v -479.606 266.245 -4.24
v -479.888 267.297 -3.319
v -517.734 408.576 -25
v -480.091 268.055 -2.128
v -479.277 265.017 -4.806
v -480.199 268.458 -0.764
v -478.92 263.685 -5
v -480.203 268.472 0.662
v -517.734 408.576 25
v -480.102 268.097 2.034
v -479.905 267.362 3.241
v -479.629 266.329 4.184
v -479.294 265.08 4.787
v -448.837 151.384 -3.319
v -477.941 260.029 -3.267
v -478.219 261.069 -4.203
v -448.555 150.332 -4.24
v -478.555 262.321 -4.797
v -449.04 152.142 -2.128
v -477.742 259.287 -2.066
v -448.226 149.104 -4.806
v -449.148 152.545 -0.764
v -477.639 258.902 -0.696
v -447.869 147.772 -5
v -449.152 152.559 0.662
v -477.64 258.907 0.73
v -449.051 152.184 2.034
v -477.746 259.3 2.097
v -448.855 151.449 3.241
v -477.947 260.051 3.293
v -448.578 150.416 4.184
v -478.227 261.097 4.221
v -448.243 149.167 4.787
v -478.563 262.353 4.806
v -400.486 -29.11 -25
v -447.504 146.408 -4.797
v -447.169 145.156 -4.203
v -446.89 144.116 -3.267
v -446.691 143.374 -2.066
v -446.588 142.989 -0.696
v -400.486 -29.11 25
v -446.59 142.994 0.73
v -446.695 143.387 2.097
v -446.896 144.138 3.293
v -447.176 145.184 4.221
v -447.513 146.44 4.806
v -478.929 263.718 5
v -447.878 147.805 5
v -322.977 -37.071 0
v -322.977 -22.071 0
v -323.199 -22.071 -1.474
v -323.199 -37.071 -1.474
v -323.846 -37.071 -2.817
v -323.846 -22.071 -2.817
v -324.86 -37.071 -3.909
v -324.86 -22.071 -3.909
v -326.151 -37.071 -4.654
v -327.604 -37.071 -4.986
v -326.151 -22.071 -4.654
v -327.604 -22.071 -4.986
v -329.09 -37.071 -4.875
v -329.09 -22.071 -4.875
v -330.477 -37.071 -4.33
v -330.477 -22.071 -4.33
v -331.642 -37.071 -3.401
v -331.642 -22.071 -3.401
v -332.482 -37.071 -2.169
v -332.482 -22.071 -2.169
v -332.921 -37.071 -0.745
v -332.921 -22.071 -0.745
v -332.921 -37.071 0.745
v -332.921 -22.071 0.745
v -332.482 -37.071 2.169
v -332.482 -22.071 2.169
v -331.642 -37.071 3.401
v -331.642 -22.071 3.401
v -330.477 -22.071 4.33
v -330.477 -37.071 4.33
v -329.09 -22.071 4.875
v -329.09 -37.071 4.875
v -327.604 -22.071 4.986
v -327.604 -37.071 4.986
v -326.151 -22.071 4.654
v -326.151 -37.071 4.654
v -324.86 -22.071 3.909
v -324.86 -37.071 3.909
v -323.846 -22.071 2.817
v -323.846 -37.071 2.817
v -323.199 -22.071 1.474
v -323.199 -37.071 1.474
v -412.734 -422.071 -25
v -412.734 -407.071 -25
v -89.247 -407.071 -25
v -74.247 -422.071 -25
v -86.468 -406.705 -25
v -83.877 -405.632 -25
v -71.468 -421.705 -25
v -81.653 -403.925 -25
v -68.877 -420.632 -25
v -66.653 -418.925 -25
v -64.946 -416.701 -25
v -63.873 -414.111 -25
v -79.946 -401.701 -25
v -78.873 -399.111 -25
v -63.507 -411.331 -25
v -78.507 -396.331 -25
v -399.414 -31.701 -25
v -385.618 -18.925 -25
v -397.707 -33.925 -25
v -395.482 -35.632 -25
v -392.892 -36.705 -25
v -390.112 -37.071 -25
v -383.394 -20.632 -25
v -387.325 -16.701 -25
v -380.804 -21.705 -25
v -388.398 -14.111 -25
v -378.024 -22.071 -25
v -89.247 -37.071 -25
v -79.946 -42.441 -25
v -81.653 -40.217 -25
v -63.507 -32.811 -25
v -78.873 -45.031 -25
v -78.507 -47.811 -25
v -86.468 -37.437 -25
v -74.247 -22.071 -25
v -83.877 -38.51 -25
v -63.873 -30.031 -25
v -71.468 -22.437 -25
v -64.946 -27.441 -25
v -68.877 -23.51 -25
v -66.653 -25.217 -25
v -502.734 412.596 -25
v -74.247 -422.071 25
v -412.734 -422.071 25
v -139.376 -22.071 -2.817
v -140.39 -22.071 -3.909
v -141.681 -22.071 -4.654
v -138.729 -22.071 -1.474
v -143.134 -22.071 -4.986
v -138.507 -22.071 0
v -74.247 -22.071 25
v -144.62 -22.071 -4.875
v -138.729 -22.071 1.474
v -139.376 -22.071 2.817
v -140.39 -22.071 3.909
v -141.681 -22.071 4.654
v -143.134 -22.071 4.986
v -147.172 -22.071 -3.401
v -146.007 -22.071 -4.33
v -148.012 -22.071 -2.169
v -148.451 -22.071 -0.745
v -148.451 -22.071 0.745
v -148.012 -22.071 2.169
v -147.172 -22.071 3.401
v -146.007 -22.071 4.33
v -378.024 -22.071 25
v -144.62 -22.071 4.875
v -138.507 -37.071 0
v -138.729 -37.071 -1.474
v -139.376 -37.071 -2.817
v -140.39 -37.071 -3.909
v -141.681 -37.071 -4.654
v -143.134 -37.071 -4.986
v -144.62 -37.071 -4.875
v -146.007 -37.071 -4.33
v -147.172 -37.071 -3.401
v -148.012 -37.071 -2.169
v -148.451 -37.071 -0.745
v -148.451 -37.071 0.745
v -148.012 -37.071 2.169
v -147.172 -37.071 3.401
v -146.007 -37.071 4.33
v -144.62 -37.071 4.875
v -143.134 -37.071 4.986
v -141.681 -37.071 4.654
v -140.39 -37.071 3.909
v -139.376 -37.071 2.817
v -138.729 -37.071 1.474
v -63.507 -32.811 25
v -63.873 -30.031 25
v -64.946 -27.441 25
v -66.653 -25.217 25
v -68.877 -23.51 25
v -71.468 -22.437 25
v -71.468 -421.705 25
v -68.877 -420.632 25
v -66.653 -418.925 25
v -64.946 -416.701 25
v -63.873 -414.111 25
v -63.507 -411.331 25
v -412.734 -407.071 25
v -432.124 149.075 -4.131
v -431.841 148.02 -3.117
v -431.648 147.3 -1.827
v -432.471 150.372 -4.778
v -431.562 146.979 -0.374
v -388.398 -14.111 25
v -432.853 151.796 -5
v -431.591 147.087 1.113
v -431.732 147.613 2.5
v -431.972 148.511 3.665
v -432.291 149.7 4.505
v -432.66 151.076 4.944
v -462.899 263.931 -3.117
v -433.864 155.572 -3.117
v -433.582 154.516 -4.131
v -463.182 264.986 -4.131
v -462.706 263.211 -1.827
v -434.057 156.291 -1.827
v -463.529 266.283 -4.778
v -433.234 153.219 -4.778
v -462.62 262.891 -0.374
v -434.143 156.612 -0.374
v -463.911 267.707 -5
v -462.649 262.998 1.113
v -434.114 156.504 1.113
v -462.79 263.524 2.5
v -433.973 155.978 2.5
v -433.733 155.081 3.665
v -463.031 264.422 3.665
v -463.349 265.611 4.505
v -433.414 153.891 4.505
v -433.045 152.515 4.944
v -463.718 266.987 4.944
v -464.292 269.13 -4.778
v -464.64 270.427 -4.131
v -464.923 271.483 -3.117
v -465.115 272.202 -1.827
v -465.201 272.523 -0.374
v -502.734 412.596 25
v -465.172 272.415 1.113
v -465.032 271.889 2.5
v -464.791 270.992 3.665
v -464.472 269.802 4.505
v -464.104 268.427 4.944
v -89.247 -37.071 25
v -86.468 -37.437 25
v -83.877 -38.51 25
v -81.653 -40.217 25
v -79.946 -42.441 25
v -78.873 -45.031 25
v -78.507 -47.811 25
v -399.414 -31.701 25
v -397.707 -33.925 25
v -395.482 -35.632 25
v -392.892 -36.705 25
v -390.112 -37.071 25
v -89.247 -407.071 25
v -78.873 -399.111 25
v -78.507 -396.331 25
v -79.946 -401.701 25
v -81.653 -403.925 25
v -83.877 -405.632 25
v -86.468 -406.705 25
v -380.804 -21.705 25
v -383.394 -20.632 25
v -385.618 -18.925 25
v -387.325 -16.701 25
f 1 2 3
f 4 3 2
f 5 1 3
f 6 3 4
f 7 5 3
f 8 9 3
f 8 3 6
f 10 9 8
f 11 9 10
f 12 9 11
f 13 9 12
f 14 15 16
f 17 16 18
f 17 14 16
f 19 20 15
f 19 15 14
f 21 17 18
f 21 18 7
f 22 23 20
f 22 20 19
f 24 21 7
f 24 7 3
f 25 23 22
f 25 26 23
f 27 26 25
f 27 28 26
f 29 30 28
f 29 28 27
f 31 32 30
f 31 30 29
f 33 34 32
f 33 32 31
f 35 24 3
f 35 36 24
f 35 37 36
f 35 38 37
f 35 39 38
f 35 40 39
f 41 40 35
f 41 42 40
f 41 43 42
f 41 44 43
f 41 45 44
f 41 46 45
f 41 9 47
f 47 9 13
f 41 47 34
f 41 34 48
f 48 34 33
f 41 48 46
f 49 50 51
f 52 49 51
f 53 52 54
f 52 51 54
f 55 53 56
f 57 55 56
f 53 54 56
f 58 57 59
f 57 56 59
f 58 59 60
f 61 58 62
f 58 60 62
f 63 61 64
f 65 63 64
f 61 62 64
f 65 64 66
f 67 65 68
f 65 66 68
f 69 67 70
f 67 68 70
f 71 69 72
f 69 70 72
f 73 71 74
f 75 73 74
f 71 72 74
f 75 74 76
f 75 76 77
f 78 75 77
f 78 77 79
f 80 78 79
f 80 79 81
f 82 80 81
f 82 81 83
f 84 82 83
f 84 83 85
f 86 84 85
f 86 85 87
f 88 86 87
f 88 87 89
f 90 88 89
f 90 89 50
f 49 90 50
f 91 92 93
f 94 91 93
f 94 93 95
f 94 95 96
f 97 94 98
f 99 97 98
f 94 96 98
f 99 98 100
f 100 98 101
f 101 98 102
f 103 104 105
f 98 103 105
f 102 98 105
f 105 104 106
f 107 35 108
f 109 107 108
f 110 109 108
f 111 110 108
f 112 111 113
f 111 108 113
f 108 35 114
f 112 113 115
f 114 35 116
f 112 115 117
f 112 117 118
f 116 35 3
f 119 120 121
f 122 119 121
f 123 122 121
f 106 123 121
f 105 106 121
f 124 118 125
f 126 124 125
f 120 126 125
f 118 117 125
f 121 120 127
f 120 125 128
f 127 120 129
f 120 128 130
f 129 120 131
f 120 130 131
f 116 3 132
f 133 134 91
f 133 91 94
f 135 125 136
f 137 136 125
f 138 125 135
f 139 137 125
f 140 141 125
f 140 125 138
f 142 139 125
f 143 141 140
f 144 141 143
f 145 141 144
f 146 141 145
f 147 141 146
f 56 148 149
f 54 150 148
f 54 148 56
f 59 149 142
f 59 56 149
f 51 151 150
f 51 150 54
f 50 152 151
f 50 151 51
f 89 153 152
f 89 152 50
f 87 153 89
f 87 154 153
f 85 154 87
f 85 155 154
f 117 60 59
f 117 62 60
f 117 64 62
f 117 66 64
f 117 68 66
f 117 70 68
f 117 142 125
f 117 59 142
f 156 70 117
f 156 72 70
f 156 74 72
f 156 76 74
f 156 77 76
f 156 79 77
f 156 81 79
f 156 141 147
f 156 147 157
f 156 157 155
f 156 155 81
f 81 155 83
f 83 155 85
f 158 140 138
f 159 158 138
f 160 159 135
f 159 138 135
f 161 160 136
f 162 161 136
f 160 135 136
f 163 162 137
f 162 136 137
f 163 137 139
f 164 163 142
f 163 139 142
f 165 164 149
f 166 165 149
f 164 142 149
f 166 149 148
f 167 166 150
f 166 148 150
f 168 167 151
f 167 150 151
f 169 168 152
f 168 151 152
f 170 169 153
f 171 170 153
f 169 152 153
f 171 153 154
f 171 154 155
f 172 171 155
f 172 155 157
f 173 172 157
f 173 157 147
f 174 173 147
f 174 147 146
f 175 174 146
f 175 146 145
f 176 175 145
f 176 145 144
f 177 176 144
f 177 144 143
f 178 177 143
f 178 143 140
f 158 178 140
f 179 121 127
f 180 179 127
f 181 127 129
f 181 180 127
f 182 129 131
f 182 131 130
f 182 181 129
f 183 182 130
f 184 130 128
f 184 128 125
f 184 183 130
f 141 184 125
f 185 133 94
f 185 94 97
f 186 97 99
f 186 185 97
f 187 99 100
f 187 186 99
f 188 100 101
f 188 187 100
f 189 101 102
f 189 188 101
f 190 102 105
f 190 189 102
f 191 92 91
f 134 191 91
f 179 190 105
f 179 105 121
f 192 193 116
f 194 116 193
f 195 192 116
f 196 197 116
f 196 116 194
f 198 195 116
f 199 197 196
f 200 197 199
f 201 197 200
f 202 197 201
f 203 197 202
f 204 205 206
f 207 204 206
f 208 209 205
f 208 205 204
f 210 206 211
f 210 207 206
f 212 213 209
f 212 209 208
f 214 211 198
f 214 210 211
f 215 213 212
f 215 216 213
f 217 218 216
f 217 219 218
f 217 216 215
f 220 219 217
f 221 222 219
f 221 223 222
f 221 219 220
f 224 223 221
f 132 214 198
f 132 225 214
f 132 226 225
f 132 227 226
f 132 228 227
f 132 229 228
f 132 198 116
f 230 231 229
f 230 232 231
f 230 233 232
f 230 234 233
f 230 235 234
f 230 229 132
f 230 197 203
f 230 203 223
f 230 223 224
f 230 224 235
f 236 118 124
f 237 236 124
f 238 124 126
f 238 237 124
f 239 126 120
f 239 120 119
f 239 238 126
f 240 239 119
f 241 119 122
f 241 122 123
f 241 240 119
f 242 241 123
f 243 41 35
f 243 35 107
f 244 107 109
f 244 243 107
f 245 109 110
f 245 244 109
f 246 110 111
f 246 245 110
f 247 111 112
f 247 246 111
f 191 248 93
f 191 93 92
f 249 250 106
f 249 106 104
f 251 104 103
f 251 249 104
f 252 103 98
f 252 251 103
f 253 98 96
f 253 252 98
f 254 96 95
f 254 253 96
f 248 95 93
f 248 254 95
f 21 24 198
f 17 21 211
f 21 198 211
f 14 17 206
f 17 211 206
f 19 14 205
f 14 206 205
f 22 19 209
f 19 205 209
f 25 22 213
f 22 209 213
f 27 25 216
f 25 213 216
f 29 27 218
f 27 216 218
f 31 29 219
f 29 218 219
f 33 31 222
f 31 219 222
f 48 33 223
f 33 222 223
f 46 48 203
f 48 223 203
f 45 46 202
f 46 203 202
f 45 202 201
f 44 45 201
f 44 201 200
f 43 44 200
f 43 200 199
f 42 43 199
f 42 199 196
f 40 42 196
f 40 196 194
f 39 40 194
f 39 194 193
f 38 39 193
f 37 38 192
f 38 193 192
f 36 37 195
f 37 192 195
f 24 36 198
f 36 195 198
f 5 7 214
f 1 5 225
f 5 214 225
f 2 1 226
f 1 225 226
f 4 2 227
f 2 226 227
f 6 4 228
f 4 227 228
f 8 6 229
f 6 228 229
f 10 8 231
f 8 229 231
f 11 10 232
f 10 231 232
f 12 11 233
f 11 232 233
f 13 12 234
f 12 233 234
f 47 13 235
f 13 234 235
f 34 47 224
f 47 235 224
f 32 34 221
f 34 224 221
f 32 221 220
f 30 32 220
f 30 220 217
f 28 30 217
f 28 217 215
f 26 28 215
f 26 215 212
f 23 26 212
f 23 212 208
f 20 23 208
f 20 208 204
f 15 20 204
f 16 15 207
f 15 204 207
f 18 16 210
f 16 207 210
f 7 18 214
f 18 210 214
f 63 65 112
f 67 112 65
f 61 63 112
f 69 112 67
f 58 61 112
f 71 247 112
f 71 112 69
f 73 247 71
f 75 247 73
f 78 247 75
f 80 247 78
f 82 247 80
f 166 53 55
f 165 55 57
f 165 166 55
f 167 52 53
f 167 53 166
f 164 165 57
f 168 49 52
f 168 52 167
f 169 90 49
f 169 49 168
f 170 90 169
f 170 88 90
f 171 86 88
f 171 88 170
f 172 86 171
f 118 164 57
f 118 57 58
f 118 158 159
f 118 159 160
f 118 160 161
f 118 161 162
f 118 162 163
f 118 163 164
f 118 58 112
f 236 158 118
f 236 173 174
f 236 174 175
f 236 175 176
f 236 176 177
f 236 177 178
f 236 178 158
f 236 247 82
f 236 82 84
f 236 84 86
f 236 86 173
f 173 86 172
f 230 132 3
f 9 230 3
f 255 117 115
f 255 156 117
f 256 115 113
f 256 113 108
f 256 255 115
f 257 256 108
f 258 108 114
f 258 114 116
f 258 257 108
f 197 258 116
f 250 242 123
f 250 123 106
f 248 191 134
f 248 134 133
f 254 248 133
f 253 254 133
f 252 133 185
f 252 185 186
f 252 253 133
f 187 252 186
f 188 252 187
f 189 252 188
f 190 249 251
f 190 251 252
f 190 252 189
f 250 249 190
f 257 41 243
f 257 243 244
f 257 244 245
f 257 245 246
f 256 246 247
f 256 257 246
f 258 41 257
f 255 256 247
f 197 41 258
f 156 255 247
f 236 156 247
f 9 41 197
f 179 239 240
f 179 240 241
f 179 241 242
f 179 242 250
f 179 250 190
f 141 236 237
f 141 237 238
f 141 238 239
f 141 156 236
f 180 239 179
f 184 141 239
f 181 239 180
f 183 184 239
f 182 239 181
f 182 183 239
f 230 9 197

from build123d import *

# Parameters (mm, degrees)
BOSS_EXTRUDE1_DEPTH = 25
SKETCH3_R           = 5
CUT_EXTRUDE1_DEPTH  = 20
SKETCH2_R           = 5
CUT_EXTRUDE2_DEPTH  = 20


with BuildPart() as part:
    # Sketch1 → Boss-Extrude1 (new body, symmetric)
    with BuildSketch(Plane.XY):
        with BuildLine():
            Line((-388.398049097, -14.110780444), (-502.733667869, 412.59555793))
            Line((-502.733667869, 412.59555793), (-517.733667869, 408.576320044))
            Line((-517.733667869, 408.576320044), (-400.48638755, -29.110107171))
            ThreePointArc((-400.48638755, -29.110107171), (-396.65053803, -34.851466611), (-390.112163796, -37.0710639))
            Line((-390.112163796, -37.0710639), (-89.247234395, -37.0710639))
            ThreePointArc((-89.247234395, -37.0710639), (-81.652907565, -40.21673707), (-78.507234395, -47.8110639))
            Line((-78.507234395, -47.8110639), (-78.507234395, -396.3310639))
            ThreePointArc((-78.507234395, -396.3310639), (-81.652907565, -403.92539073), (-89.247234395, -407.0710639))
            Line((-89.247234395, -407.0710639), (-412.734449588, -407.0710639))
            Line((-412.734449588, -407.0710639), (-412.734449588, -422.0710639))
            Line((-412.734449588, -422.0710639), (-74.247234395, -422.0710639))
            ThreePointArc((-74.247234395, -422.0710639), (-66.652907565, -418.92539073), (-63.507234395, -411.3310639))
            Line((-63.507234395, -411.3310639), (-63.507234395, -32.8110639))
            ThreePointArc((-63.507234395, -32.8110639), (-66.652907565, -25.21673707), (-74.247234395, -22.0710639))
            Line((-74.247234395, -22.0710639), (-378.024005722, -22.0710639))
            ThreePointArc((-378.024005722, -22.0710639), (-384.56210347, -19.851678775), (-388.398049097, -14.110780444))
        make_face()
    extrude(amount=BOSS_EXTRUDE1_DEPTH, both=True)

    # Sketch3 → Cut-Extrude1 (cut)
    with BuildSketch(Plane(origin=(0, -22.0710639, 0), x_dir=(1, 0, 0), z_dir=(0, 1, 0))):
        with Locations((-327.977212353, 0)):
            Circle(SKETCH3_R)
        with Locations((-143.507234395, 0)):
            Circle(SKETCH3_R)
    extrude(amount=-CUT_EXTRUDE1_DEPTH, mode=Mode.SUBTRACT)

    # Sketch2 → Cut-Extrude2 (cut)
    with BuildSketch(Plane(origin=(-365.908008308, -98.04475533, 0), x_dir=(0, 0, -1), z_dir=(0.965925826, 0.258819045, 0))):
        with Locations((0, 378.653753076)):
            Circle(SKETCH2_R)
        with Locations((0, 258.653753076)):
            Circle(SKETCH2_R)
    extrude(amount=-CUT_EXTRUDE2_DEPTH, mode=Mode.SUBTRACT)


solid = part.part
